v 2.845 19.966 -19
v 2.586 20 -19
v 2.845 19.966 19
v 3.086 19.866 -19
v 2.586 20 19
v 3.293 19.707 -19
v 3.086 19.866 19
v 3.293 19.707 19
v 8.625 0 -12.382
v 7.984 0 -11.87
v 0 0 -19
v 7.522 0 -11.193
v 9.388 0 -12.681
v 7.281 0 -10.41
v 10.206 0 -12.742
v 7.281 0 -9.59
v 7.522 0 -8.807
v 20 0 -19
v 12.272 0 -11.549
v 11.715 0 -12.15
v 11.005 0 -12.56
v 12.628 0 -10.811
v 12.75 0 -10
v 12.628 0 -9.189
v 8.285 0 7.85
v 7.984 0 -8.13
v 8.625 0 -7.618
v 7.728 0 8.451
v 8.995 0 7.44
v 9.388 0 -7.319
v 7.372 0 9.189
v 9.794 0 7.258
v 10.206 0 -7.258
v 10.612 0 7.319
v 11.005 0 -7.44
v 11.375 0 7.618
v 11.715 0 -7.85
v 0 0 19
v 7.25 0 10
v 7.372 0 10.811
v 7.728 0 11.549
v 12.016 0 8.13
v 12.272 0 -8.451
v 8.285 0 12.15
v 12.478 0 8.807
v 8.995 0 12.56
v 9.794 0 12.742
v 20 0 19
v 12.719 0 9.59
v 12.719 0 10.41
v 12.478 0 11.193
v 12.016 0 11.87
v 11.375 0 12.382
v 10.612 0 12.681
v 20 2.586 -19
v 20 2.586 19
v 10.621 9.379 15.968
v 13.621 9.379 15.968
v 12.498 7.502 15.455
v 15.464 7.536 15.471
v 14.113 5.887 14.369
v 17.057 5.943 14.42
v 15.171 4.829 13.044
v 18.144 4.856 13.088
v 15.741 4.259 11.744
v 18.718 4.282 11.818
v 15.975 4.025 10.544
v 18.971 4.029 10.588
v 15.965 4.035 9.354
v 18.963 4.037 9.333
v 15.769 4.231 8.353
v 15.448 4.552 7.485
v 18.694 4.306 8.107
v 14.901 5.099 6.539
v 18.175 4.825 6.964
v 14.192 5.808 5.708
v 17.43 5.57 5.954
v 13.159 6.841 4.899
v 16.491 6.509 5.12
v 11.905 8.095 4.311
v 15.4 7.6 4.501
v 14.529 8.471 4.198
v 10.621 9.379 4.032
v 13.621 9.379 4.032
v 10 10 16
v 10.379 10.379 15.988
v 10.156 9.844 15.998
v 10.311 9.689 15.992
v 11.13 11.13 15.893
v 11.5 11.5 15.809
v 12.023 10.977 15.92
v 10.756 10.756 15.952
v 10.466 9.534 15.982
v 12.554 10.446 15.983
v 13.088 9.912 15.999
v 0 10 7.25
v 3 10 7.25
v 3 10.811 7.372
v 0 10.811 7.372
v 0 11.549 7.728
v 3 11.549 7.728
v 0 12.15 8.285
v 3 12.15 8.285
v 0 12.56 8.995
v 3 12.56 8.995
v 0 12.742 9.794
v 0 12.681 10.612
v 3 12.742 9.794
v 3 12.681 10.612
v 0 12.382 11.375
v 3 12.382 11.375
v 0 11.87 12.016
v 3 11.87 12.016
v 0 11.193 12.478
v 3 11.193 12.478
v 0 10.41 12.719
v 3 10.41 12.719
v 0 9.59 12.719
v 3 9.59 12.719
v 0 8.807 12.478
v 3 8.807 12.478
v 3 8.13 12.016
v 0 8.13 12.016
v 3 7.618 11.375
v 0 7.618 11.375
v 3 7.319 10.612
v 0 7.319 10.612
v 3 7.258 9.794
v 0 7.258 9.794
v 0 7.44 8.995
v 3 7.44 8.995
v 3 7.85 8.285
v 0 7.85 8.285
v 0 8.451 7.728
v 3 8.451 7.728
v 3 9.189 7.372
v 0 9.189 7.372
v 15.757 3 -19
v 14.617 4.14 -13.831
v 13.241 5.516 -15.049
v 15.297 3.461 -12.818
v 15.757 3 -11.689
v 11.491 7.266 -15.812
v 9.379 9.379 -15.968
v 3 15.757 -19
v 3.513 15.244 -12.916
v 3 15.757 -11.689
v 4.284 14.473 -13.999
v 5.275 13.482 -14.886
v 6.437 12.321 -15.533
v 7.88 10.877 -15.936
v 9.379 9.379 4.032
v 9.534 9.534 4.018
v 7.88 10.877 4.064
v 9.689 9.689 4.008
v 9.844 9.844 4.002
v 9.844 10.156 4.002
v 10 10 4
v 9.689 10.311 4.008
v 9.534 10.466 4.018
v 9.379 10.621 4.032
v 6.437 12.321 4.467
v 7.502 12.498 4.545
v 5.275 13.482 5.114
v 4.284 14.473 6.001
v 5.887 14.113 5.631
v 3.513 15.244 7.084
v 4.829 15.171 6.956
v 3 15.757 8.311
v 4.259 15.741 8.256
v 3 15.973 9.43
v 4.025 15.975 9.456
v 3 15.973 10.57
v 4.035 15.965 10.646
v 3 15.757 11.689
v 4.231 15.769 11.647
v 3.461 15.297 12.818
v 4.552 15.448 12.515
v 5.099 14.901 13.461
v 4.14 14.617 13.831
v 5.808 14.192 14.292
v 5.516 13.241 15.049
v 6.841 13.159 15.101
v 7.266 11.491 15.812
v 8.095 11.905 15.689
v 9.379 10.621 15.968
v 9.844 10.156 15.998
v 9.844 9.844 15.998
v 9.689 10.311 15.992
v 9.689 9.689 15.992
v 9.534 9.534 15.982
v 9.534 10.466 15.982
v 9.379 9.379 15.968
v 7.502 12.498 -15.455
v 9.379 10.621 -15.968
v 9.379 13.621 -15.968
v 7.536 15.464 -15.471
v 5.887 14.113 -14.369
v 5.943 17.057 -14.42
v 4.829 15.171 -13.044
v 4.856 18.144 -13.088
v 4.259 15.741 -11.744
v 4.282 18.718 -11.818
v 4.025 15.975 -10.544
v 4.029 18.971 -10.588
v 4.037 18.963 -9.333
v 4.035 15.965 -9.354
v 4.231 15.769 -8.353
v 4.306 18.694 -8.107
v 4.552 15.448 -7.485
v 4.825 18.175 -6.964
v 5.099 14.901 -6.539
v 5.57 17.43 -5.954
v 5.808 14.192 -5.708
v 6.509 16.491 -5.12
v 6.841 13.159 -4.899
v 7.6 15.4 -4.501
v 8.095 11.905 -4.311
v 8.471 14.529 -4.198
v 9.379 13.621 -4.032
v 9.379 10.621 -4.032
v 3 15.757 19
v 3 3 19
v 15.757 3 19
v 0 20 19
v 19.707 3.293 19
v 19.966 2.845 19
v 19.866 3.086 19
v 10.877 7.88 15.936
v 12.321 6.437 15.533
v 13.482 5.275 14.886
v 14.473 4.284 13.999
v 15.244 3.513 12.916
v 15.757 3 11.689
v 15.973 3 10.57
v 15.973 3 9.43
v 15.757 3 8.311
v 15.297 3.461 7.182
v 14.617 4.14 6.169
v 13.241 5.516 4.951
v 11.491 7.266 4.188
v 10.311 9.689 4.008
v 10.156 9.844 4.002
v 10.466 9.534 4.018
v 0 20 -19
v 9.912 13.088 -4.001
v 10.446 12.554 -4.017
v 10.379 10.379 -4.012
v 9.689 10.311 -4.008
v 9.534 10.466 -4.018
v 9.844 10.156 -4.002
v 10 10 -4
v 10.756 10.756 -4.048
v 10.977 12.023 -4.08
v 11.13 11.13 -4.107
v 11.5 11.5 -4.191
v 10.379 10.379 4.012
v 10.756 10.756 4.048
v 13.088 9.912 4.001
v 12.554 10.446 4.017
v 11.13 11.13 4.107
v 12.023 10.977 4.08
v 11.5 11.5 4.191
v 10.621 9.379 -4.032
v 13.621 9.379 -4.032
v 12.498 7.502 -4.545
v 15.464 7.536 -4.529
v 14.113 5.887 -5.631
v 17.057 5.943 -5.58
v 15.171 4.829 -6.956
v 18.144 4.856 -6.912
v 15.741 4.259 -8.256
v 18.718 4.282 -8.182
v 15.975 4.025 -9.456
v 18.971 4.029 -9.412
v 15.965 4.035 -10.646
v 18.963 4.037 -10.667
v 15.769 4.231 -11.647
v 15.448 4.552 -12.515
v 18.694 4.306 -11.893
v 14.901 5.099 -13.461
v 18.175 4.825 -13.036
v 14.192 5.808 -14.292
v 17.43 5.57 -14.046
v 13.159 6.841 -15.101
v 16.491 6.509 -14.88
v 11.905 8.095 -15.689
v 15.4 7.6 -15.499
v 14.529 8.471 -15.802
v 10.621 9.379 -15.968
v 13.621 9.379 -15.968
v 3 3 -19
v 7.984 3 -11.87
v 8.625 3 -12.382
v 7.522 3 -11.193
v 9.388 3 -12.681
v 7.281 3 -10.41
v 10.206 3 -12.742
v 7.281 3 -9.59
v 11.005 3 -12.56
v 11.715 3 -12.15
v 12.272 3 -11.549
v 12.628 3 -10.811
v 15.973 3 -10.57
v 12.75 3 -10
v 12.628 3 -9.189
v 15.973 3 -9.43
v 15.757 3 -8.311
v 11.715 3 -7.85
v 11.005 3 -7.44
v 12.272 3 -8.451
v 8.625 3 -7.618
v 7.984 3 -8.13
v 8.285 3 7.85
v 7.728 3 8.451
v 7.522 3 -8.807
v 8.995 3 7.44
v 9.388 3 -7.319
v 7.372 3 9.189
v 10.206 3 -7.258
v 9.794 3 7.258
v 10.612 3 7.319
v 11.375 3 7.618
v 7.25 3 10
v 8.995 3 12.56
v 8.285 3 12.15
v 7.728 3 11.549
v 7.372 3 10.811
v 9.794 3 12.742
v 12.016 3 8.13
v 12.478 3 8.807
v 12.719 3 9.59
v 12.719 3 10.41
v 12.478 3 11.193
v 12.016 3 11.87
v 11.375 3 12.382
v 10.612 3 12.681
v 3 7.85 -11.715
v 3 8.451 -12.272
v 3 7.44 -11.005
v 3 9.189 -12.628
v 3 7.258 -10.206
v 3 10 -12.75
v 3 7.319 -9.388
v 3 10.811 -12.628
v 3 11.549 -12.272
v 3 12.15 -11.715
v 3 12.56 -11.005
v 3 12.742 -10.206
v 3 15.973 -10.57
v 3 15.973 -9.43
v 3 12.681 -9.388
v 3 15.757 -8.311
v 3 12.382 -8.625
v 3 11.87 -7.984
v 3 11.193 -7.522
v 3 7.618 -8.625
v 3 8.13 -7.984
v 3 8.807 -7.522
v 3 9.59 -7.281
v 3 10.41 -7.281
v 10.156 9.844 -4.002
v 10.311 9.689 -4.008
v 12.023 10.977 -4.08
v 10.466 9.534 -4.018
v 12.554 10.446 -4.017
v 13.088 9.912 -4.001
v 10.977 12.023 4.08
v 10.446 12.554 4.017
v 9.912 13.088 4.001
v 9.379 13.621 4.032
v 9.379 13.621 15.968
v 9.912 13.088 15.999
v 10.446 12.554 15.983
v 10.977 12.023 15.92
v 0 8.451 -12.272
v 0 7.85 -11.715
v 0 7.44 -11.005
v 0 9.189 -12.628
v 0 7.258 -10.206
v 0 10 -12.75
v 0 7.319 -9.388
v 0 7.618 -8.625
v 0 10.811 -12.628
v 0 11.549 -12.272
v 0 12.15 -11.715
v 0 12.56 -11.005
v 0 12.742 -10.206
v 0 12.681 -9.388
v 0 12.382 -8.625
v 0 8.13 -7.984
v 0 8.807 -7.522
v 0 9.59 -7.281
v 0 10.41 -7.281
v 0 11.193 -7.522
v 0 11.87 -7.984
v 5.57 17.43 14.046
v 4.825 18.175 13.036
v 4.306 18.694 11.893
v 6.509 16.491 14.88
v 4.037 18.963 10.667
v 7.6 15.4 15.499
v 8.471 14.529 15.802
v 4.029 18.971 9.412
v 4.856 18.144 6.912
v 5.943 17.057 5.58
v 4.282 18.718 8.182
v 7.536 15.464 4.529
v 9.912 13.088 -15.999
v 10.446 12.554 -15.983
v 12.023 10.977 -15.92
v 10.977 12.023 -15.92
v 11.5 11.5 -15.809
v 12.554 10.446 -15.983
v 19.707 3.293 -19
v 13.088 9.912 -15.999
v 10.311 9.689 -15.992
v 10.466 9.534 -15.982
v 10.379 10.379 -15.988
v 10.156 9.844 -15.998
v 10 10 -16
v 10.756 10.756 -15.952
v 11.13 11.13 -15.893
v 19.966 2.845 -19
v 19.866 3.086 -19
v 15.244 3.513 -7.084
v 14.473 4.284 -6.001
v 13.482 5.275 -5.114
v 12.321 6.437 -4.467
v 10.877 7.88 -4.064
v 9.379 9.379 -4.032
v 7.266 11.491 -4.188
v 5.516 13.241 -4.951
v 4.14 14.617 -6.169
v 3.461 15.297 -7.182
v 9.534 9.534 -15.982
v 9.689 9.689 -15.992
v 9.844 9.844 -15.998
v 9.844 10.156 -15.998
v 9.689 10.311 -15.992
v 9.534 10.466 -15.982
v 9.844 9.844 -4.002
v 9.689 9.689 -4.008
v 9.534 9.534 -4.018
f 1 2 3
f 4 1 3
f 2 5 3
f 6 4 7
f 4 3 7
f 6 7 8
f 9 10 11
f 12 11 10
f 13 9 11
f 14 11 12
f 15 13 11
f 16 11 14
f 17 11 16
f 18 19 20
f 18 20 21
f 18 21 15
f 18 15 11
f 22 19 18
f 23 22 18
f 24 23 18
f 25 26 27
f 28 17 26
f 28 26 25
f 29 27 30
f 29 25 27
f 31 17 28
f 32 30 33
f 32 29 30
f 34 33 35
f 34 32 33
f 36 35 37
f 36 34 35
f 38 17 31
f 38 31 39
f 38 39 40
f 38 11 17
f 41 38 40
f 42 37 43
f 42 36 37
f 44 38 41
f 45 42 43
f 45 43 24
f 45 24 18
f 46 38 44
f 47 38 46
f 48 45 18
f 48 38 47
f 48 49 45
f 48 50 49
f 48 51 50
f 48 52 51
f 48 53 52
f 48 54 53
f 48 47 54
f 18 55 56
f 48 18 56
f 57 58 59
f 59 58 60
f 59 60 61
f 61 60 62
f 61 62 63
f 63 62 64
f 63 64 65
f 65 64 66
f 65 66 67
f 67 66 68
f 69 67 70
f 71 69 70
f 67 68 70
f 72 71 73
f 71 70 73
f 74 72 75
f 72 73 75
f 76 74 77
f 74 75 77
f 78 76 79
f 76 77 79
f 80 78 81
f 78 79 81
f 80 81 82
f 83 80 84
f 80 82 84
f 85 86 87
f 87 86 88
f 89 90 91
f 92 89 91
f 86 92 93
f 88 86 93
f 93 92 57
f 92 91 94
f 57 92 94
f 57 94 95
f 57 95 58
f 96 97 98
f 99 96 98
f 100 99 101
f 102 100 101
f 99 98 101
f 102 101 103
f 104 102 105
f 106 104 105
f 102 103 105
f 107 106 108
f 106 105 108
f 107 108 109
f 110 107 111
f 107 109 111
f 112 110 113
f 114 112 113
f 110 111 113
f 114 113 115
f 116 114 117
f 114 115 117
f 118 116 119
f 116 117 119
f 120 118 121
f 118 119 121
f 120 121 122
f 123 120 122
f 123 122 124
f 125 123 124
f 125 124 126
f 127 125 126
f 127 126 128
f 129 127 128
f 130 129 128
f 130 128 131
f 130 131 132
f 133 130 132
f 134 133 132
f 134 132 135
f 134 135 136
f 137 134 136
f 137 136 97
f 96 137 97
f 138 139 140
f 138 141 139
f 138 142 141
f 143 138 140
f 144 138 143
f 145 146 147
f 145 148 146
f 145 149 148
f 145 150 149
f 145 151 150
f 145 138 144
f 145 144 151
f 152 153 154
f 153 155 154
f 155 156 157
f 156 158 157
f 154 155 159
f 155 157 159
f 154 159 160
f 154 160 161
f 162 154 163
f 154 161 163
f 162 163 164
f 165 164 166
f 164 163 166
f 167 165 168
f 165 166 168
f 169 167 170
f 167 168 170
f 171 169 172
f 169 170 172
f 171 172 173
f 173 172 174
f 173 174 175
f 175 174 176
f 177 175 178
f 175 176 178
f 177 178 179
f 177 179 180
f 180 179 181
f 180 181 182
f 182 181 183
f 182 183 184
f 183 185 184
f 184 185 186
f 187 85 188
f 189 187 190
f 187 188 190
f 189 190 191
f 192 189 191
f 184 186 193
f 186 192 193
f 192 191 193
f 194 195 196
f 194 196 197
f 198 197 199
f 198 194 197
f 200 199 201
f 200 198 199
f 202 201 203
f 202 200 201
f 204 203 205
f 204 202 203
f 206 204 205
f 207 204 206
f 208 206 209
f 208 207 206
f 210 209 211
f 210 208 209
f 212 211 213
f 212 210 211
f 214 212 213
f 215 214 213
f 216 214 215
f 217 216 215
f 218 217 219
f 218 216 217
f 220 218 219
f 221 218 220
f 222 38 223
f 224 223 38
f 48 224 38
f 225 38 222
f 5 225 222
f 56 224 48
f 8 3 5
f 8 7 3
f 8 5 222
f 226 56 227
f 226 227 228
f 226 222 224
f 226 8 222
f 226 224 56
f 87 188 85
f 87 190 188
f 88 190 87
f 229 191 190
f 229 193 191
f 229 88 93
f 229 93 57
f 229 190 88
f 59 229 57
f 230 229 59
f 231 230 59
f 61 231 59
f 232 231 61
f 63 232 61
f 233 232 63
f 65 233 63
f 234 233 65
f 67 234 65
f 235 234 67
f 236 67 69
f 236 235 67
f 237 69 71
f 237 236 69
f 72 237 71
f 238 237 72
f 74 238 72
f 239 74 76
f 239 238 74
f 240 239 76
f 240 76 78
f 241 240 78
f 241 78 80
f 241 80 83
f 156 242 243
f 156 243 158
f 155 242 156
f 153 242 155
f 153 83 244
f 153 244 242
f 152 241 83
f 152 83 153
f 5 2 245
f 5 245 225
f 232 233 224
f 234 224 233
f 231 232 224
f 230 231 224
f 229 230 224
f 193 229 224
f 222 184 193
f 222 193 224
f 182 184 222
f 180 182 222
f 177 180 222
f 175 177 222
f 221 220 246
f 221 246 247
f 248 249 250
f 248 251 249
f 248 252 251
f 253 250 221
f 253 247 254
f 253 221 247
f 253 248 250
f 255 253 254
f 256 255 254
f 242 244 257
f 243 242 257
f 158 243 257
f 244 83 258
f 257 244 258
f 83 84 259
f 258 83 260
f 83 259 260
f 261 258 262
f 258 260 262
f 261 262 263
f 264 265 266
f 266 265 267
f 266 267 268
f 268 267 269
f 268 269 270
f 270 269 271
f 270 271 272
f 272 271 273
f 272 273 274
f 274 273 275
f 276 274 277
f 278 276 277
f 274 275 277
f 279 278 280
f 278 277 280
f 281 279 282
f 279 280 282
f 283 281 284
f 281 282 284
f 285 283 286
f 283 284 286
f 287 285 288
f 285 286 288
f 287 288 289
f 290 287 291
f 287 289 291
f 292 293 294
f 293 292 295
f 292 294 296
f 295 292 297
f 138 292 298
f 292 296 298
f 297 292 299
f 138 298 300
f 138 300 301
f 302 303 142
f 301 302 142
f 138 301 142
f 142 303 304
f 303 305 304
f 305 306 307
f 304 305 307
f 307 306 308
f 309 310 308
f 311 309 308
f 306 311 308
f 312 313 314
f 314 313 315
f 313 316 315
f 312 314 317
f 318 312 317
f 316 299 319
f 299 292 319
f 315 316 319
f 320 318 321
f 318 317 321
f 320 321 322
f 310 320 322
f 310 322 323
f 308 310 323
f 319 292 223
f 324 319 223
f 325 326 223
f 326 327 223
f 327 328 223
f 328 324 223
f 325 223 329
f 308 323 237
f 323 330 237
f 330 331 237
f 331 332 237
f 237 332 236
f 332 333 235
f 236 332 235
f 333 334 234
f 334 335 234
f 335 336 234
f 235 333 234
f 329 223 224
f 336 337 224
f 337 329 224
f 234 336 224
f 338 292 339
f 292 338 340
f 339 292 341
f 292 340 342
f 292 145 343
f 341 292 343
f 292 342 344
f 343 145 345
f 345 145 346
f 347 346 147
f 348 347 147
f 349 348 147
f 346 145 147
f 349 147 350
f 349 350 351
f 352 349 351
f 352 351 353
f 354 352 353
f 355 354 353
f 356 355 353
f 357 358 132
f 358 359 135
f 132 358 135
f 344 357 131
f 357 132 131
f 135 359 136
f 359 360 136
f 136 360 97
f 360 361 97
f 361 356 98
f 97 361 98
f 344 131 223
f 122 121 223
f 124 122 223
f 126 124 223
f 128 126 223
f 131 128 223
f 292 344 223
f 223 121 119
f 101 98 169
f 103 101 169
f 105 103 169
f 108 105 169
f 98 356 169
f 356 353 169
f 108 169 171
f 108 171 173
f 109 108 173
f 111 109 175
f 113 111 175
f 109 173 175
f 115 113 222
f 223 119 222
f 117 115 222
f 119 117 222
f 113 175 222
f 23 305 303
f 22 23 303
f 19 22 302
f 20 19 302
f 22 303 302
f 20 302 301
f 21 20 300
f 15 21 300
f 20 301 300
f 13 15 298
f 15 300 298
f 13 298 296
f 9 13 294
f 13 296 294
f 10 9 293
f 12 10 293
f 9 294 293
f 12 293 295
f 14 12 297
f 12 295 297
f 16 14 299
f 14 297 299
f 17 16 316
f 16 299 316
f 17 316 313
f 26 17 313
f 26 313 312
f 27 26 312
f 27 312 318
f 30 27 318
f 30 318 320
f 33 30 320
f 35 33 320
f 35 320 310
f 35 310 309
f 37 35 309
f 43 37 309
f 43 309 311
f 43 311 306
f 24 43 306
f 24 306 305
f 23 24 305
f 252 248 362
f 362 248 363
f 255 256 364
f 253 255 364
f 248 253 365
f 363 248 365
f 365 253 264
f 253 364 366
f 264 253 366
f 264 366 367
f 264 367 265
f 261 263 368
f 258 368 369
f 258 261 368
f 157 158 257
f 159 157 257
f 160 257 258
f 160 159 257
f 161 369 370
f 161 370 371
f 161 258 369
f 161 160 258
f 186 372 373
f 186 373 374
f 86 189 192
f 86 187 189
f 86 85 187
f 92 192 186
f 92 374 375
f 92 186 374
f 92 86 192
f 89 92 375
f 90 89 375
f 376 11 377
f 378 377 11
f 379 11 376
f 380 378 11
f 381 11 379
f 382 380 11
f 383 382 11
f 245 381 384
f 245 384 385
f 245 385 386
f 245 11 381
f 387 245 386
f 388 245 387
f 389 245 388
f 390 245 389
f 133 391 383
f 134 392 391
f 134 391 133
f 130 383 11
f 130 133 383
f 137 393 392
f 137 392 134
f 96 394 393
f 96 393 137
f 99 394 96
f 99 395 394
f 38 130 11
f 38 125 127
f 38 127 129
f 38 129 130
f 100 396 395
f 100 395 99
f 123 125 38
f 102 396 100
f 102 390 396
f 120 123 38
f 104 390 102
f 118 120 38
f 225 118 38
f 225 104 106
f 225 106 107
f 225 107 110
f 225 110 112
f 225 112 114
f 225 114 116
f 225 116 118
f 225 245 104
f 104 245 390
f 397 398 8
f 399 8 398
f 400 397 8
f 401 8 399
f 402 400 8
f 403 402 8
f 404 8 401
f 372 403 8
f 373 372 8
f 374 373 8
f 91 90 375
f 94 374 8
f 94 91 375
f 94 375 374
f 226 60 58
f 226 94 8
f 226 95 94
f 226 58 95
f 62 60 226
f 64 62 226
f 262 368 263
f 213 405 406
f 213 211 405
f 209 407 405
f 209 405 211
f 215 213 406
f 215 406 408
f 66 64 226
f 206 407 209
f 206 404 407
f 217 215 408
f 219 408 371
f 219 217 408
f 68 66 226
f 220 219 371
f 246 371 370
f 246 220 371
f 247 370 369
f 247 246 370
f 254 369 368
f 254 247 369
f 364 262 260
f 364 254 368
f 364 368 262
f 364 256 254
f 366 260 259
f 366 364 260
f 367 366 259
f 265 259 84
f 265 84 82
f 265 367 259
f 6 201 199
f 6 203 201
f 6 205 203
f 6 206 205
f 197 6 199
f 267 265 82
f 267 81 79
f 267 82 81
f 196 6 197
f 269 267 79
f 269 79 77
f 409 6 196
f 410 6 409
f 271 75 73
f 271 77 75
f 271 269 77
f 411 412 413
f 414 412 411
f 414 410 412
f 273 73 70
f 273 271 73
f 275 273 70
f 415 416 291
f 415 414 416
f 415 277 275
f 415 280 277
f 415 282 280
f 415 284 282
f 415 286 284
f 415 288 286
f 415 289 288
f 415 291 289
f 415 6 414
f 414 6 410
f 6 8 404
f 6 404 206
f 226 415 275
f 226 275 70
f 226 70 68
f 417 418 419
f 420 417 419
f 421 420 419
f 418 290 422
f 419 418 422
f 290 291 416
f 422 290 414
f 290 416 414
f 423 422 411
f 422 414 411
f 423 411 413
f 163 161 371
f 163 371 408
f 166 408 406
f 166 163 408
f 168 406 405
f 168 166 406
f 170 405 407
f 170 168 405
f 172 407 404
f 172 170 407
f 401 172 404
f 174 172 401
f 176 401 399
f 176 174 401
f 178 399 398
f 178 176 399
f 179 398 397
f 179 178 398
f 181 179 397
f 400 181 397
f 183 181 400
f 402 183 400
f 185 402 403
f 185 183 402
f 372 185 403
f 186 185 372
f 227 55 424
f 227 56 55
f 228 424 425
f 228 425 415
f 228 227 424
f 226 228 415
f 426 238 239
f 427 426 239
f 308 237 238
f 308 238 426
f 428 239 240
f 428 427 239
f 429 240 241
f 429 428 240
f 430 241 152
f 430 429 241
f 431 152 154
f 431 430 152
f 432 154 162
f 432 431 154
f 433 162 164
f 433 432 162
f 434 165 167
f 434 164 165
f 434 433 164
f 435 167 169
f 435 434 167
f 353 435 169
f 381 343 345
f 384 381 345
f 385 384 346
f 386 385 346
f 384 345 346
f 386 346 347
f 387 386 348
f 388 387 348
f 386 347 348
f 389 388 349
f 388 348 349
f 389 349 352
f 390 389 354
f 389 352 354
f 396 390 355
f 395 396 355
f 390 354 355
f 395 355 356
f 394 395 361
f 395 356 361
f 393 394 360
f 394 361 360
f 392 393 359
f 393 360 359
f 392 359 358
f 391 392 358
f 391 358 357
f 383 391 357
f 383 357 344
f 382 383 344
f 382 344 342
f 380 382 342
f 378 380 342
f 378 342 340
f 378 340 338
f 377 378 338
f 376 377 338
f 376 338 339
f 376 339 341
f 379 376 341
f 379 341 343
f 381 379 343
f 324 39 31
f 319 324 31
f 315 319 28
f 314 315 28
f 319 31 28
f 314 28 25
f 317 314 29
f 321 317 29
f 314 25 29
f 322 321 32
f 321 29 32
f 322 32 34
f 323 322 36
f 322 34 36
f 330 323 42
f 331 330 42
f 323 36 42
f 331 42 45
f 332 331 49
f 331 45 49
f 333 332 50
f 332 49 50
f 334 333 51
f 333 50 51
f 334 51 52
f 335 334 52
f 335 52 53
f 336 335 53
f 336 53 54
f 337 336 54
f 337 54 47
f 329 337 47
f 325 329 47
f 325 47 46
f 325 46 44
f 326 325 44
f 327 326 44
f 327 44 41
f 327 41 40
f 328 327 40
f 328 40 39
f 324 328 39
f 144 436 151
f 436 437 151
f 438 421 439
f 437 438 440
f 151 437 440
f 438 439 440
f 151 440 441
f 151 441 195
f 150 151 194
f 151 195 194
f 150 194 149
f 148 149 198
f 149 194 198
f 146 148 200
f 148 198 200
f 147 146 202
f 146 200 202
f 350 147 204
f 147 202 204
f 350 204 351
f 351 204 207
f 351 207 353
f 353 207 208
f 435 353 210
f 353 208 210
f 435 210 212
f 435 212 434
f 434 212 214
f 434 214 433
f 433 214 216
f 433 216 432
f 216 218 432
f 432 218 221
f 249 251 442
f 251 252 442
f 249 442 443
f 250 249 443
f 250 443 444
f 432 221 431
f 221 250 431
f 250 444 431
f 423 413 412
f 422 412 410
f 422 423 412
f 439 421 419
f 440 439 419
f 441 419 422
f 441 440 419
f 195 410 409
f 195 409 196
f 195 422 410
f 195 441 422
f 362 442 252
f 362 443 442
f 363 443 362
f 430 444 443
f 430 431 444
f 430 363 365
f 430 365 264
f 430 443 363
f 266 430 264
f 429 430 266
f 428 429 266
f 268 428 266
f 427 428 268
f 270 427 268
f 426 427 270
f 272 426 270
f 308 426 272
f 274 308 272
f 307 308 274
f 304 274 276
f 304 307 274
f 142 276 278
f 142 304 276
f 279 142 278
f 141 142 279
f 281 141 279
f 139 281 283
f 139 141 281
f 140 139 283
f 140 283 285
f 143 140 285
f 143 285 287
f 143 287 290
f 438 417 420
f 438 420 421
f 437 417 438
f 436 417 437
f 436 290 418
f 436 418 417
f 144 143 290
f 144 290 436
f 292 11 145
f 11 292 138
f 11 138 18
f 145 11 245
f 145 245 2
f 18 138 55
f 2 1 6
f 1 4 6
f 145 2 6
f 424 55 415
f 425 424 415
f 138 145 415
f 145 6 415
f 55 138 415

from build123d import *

# Parameters (mm, degrees)
BOSS_EXTRUDE1_START     = -17
BOSS_EXTRUDE1_OUTLINE_W = 38
BOSS_EXTRUDE1_OUTLINE_H = 17
BOSS_EXTRUDE1_DEPTH     = 20
BOSS_EXTRUDE1_2_DEPTH   = 3
BOSS_EXTRUDE1_START_2   = 3
BOSS_EXTRUDE1_3_DEPTH   = 17
BOSS_EXTRUDE1_START_3   = -19
BOSS_EXTRUDE1_4_DEPTH   = 38
SKETCH2_W               = 20
SKETCH2_H               = 38
BOSS_EXTRUDE2_DEPTH     = 3
F_10_CLEARANCE_HOLE1_D  = 5.5
F_10_CLEARANCE_HOLE2_D  = 5.5
F_10_CLEARANCE_HOLE3_D  = 5.5
F_10_CLEARANCE_HOLE4_D  = 5.5
FILLET1_R               = 1


with BuildPart() as part:
    # Boss-Extrude1: read off the stored shape, not the designer's step
    # Boss-Extrude1 outline → Boss-Extrude1 (new body)
    with BuildSketch(Plane.ZY.offset(-3).offset(BOSS_EXTRUDE1_START)):
        with Locations((0, 11.5)):
            Rectangle(BOSS_EXTRUDE1_OUTLINE_W, BOSS_EXTRUDE1_OUTLINE_H)
        with BuildLine():
            ThreePointArc((-15.967743378, 9.378679656), (-10, 16), (-4.032256622, 9.378679656))
            ThreePointArc((-4.032256622, 9.378679656), (-10, 4), (-15.967743378, 9.378679656))
        make_face(mode=Mode.SUBTRACT)
        with BuildLine():
            ThreePointArc((4.032256622, 9.378679656), (10, 16), (15.967743378, 9.378679656))
            ThreePointArc((15.967743378, 9.378679656), (10, 4), (4.032256622, 9.378679656))
        make_face(mode=Mode.SUBTRACT)
    extrude(amount=BOSS_EXTRUDE1_DEPTH)

    # Boss-Extrude1 2 outline → Boss-Extrude1 2 (add)
    with BuildSketch(Plane.ZY.offset(-3)):
        with BuildLine():
            ThreePointArc((4.032256622, 9.378679656), (10, 4), (15.967743378, 9.378679656))
            ThreePointArc((15.967743378, 9.378679656), (10, 16), (4.032256622, 9.378679656))
        make_face()
        with BuildLine():
            ThreePointArc((-15.967743378, 9.378679656), (-10, 4), (-4.032256622, 9.378679656))
            ThreePointArc((-4.032256622, 9.378679656), (-10, 16), (-15.967743378, 9.378679656))
        make_face()
    extrude(amount=BOSS_EXTRUDE1_2_DEPTH)

    # Boss-Extrude1 3 outline → Boss-Extrude1 3 (cut)
    with BuildSketch(Plane(origin=(0, 0, 0), x_dir=(1, 0, 0), z_dir=(0, 1, 0)).offset(BOSS_EXTRUDE1_START_2)):
        with BuildLine():
            ThreePointArc((9.378679656, -15.967743378), (16, -10), (9.378679656, -4.032256622))
            ThreePointArc((9.378679656, -4.032256622), (4, -10), (9.378679656, -15.967743378))
        make_face()
        with BuildLine():
            ThreePointArc((9.378679656, 4.032256622), (16, 10), (9.378679656, 15.967743378))
            ThreePointArc((9.378679656, 15.967743378), (4, 10), (9.378679656, 4.032256622))
        make_face()
    extrude(amount=BOSS_EXTRUDE1_3_DEPTH, mode=Mode.SUBTRACT)

    # Boss-Extrude1 4 outline → Boss-Extrude1 4 (cut)
    with BuildSketch(Plane.XY.offset(BOSS_EXTRUDE1_START_3)):
        Polygon((3, 3), (15.757359313, 3), (3, 15.757359313), align=None)
        Polygon((3, 20), (20, 3), (20, 20), align=None)
    extrude(amount=BOSS_EXTRUDE1_4_DEPTH, mode=Mode.SUBTRACT)

    # Sketch2 → Boss-Extrude2 (add)
    with BuildSketch(Plane.XZ.offset(-3)):
        with Locations((10, 0)):
            Rectangle(SKETCH2_W, SKETCH2_H)
    extrude(amount=BOSS_EXTRUDE2_DEPTH)

    # #10 Clearance Hole1 (through all)
    with Locations(Plane(origin=(0, 3, 0), x_dir=(1, 0, 0), z_dir=(0, 1, 0))):
        with Locations((10, -10)):
            Hole(F_10_CLEARANCE_HOLE1_D / 2)

    # #10 Clearance Hole2 (through all)
    with Locations(Plane.ZY):
        with Locations((-10, 10)):
            Hole(F_10_CLEARANCE_HOLE2_D / 2)

    # #10 Clearance Hole3 (through all)
    with Locations(Plane.ZY):
        with Locations((10, 10)):
            Hole(F_10_CLEARANCE_HOLE3_D / 2)

    # #10 Clearance Hole4 (through all)
    with Locations(Plane(origin=(0, 0, 0), x_dir=(-1, 0, 0), z_dir=(0, -1, 0))):
        with Locations((-10, 10)):
            Hole(F_10_CLEARANCE_HOLE4_D / 2)

    # Fillet1
    fillet1_edges = [part.edges().sort_by_distance(p)[0] for p in [
        (20, 3, 0),
        (3, 20, 0),
    ]]
    fillet(fillet1_edges, radius=FILLET1_R)


solid = part.part
